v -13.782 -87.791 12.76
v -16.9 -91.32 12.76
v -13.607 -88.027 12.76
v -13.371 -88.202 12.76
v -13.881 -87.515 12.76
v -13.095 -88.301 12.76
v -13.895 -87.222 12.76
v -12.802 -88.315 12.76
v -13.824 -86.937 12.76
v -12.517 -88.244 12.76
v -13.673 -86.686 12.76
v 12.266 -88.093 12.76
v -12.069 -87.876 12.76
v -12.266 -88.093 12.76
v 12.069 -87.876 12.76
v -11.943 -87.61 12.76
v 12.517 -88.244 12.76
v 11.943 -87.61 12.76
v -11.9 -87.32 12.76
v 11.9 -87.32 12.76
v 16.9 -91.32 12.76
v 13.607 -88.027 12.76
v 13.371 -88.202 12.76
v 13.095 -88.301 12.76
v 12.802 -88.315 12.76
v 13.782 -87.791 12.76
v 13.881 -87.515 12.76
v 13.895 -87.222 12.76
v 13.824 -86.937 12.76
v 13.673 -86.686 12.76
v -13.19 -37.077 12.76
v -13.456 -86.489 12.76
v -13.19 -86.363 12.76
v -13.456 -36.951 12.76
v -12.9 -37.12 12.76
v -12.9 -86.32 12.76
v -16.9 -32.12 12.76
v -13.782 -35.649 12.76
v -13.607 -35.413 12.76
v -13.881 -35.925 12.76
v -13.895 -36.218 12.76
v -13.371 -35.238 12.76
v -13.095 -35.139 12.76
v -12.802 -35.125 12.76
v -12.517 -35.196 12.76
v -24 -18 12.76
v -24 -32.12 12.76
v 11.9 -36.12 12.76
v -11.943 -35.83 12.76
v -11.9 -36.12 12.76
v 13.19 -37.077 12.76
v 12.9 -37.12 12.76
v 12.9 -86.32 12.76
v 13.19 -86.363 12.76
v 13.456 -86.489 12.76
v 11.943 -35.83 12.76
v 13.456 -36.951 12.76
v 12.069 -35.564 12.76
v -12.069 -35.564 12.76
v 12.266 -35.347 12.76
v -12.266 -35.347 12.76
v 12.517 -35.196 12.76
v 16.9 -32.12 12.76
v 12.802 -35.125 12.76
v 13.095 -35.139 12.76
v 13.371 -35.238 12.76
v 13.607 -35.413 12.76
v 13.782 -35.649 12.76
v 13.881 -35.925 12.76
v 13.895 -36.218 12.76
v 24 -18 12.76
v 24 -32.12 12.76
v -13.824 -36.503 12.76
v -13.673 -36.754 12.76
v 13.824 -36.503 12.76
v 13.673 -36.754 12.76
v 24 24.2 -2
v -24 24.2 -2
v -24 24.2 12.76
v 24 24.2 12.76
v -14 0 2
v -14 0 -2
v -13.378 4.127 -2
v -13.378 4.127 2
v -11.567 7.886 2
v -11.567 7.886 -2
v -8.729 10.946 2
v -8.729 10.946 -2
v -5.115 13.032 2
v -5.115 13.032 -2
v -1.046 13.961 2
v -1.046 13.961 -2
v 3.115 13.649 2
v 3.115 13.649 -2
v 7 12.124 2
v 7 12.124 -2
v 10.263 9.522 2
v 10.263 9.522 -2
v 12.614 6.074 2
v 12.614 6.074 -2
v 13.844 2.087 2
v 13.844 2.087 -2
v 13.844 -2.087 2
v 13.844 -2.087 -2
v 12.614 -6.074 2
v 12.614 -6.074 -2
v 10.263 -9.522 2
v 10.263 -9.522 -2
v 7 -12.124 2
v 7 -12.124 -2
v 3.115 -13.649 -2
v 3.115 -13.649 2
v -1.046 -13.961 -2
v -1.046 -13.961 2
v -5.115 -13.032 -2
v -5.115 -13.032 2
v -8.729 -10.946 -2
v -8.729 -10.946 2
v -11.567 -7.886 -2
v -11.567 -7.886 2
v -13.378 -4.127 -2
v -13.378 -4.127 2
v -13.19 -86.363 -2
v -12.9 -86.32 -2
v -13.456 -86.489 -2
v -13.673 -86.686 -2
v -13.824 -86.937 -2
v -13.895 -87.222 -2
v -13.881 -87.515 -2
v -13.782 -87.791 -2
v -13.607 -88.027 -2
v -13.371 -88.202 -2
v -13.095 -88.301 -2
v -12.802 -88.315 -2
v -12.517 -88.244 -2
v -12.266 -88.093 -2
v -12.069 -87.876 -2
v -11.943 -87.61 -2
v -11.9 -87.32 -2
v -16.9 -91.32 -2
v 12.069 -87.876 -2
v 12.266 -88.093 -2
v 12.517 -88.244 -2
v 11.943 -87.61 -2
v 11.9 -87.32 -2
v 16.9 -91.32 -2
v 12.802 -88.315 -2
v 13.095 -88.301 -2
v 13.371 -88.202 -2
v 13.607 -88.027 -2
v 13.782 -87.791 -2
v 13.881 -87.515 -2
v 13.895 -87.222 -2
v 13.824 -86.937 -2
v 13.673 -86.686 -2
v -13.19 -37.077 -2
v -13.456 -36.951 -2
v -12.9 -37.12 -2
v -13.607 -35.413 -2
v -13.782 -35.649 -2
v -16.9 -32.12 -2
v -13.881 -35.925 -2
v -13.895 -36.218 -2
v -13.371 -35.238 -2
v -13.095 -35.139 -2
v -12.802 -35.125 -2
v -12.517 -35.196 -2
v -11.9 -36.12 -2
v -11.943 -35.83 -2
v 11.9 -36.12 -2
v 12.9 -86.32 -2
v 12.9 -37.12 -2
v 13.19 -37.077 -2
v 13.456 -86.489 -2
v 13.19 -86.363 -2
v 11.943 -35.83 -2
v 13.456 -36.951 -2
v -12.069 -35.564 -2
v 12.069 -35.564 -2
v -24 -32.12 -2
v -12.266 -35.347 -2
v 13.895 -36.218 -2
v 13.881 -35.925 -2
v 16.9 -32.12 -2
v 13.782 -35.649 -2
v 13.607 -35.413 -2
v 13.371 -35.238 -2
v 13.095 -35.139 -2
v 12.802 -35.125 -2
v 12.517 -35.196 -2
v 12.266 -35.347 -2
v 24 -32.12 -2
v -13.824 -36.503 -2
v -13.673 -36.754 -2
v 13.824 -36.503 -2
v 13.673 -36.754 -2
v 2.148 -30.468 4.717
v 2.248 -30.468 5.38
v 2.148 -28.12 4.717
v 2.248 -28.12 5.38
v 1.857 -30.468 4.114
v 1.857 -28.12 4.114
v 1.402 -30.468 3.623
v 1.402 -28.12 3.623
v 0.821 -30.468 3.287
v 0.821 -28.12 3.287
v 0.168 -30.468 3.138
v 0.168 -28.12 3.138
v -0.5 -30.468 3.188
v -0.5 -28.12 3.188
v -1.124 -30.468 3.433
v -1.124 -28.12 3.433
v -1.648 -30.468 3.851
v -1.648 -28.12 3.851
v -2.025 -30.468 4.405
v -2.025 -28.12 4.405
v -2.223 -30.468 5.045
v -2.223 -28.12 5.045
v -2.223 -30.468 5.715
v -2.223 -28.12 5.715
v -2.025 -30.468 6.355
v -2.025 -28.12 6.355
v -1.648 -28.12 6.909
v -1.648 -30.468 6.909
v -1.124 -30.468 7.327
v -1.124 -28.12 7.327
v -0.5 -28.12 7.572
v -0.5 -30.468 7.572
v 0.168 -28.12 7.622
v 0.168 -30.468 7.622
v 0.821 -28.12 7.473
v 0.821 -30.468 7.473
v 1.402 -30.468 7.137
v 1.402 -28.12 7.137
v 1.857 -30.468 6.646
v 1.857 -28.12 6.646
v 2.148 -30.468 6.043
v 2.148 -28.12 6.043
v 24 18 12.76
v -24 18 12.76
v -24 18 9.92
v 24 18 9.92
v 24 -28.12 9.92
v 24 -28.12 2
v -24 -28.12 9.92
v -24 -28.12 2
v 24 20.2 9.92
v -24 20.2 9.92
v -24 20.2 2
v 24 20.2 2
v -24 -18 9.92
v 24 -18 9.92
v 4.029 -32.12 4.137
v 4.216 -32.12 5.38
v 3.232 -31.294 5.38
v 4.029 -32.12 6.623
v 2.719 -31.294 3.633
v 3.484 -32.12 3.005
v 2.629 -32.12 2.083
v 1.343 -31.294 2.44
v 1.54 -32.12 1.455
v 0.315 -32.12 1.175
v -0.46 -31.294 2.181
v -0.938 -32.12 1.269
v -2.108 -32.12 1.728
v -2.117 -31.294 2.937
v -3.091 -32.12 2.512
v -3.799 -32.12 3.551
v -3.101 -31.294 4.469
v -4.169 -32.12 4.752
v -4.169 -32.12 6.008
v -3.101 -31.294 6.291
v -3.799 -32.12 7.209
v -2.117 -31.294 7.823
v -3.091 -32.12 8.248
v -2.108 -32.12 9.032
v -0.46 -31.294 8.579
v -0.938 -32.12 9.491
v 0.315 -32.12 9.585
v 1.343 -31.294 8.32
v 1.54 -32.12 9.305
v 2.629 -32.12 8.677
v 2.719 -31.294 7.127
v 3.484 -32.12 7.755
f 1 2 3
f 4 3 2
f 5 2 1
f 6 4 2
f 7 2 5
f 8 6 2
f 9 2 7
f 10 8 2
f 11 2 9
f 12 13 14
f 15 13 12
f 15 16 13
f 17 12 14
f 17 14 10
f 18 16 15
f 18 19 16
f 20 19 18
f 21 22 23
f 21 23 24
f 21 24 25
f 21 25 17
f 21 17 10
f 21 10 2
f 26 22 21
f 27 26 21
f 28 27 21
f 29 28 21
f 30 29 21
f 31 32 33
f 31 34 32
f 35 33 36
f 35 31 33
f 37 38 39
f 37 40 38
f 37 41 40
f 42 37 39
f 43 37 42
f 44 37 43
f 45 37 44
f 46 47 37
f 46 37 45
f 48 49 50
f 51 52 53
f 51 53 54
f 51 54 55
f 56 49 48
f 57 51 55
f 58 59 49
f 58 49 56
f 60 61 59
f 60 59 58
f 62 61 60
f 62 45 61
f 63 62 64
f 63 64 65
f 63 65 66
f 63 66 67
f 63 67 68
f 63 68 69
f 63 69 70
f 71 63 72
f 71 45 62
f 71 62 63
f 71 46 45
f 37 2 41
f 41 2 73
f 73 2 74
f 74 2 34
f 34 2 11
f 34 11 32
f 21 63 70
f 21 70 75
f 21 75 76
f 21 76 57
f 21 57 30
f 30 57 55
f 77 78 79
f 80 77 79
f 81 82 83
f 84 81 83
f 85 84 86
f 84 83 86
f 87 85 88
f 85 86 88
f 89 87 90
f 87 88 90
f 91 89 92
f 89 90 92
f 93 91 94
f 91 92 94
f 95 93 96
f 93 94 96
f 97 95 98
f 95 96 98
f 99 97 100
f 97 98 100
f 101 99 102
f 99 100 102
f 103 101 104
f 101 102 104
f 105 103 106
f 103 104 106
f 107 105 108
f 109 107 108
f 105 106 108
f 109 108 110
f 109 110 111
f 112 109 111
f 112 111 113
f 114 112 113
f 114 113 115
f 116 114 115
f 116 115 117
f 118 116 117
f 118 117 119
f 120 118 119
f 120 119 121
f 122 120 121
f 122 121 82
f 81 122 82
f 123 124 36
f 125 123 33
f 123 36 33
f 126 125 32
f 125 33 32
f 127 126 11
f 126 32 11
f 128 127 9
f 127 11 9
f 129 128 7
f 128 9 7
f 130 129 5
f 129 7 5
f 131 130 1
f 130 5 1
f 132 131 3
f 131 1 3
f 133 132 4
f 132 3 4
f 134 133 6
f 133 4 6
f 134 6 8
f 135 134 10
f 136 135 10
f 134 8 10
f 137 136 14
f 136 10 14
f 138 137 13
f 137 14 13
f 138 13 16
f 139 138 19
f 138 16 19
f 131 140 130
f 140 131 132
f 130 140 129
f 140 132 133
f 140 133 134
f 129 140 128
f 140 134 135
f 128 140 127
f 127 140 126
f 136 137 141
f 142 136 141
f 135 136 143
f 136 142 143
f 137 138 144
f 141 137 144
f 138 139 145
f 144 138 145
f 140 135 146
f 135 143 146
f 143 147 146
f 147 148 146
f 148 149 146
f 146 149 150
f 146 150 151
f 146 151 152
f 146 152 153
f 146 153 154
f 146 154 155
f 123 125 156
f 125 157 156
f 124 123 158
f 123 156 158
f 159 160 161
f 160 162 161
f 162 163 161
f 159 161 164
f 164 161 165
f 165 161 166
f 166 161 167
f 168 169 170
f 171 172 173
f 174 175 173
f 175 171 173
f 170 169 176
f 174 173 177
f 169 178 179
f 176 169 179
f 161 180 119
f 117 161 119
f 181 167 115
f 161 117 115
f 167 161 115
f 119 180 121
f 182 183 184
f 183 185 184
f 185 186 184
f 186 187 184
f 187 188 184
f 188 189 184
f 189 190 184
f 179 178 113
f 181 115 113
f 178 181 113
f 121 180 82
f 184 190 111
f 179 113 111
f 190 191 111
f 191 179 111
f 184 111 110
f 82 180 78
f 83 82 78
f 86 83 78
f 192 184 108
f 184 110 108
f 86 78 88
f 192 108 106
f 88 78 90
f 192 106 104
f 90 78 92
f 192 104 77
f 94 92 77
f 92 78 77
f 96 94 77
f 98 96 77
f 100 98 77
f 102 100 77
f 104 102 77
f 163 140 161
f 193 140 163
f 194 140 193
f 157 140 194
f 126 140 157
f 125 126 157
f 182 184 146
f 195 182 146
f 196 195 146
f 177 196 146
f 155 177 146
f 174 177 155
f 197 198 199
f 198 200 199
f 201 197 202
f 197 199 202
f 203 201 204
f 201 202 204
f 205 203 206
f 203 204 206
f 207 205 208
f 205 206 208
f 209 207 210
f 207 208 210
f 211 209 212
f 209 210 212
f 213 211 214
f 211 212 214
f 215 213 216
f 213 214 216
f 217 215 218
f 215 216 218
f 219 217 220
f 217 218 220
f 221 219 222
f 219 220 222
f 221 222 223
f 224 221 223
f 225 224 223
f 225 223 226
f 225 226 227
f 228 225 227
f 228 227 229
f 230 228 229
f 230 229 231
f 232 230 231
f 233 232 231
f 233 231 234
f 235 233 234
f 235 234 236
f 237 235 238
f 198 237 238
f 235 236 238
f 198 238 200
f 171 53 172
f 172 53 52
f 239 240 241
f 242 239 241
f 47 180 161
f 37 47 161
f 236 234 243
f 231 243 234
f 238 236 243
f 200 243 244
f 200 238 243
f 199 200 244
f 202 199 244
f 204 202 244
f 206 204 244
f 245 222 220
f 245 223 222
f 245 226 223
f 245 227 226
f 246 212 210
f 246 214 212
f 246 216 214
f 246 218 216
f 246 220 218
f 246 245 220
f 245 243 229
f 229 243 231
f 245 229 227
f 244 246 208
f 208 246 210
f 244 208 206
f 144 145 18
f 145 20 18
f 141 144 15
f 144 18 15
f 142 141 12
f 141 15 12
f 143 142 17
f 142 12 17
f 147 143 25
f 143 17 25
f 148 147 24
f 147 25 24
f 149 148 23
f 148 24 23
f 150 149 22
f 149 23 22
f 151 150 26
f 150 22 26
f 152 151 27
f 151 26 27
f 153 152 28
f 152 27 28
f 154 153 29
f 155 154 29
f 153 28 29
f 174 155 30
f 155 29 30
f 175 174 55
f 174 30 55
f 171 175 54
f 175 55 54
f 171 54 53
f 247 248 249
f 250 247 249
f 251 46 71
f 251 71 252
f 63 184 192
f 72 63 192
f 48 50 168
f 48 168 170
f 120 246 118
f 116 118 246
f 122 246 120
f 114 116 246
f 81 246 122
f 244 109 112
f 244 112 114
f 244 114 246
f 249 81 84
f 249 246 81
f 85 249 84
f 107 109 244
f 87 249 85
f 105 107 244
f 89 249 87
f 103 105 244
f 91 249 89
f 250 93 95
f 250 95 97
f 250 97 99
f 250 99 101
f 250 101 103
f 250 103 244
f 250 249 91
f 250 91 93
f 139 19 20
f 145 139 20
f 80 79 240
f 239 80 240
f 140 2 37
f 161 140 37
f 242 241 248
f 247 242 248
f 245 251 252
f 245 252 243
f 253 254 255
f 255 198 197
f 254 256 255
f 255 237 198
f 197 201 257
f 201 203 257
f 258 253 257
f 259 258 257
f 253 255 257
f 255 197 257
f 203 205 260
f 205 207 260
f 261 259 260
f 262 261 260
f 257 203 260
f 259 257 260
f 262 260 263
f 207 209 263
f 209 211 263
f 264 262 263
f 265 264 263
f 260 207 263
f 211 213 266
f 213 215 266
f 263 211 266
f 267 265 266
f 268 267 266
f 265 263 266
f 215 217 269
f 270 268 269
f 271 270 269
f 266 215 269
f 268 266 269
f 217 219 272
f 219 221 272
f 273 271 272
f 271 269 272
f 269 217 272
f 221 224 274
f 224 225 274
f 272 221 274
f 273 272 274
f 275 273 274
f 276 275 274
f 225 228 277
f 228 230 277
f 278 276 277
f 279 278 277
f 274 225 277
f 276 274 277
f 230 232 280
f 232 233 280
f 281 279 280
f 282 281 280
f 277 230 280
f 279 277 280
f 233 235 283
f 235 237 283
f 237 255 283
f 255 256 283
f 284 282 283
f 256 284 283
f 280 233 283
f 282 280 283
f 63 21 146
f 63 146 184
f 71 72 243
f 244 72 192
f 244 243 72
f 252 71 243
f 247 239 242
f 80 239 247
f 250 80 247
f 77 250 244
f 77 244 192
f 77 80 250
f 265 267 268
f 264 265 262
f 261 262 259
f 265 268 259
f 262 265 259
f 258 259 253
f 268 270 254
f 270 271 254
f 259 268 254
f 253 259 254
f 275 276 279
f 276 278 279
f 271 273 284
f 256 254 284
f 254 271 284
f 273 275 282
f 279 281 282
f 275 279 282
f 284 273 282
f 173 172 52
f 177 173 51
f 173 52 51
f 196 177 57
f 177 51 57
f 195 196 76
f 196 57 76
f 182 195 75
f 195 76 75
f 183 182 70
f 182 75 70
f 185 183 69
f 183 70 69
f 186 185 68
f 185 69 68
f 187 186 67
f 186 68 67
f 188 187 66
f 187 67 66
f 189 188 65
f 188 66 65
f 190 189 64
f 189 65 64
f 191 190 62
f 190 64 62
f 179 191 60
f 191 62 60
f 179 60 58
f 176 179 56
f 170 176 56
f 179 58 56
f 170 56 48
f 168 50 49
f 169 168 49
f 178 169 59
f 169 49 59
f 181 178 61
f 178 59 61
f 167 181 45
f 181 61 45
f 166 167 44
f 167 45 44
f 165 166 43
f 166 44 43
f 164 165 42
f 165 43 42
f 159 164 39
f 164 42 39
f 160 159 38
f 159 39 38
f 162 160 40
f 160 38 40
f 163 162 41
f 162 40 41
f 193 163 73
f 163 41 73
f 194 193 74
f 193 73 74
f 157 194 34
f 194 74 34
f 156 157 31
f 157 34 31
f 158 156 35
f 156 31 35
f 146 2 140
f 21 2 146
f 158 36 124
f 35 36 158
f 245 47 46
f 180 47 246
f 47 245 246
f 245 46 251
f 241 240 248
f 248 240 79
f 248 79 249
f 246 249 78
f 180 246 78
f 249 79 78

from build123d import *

# Parameters (mm, degrees)
BOSS_EXTRUDE1_DEPTH                               = 2
BOSS_EXTRUDE1_DEPTH_BACK                          = 2
SKETCH1_W                                         = 48
SKETCH1_H                                         = 56.32
BOSS_EXTRUDE2_DEPTH                               = 48
SKETCH4_R                                         = 14
CUT_EXTRUDE1_DEPTH                                = 43.726478909
CSK_FOR_8_FLAT_HEAD_MACHINE_SCREW_100_D           = 4.4958
CSK_FOR_8_FLAT_HEAD_MACHINE_SCREW_100_DEPTH       = 8
CSK_FOR_8_FLAT_HEAD_MACHINE_SCREW_100_CSINK_D     = 8.4328
CSK_FOR_8_FLAT_HEAD_MACHINE_SCREW_100_CSINK_ANGLE = 100
CSK_FOR_8_FLAT_HEAD_MACHINE_SCREW_100_TIP         = 1.350674586
SKETCH13_W                                        = 33.8
SKETCH13_H                                        = 59.2
SKETCH13_W_2                                      = 25.8
SKETCH13_H_2                                      = 51.2
BOSS_EXTRUDE4_DEPTH                               = 14.76
SKETCH14_R                                        = 1
CUT_EXTRUDE5_DEPTH                                = 96.567776996


with BuildPart() as part:
    # Sketch1 → Boss-Extrude1 (new, two sides: drawn at the far end of the back side and taken through both)
    with BuildSketch(Plane.XY.offset(-BOSS_EXTRUDE1_DEPTH_BACK)):
        with Locations((0, -3.96)):
            Rectangle(SKETCH1_W, SKETCH1_H)
    extrude(amount=BOSS_EXTRUDE1_DEPTH + BOSS_EXTRUDE1_DEPTH_BACK)

    # Sketch3 → Boss-Extrude2 (add)
    with BuildSketch(Plane.ZY.offset(24)):
        Polygon((2, 24.2), (12.76, 24.2), (12.76, 18), (9.92, 18), (9.92, 20.2), (2, 20.2), align=None)
        Polygon((12.76, -18), (9.92, -18), (9.92, -28.12), (2, -28.12), (2, -32.12), (12.76, -32.12), align=None)
    extrude(amount=-BOSS_EXTRUDE2_DEPTH)

    # Sketch4 → Cut-Extrude1 (cut, through all)
    with BuildSketch(Plane(origin=(0, 0, -2), x_dir=(-1, 0, 0), z_dir=(0, 0, -1))):
        Circle(SKETCH4_R)
    extrude(amount=-CUT_EXTRUDE1_DEPTH, mode=Mode.SUBTRACT)

    # CSK for #8 Flat Head Machine Screw (100)1
    with Locations(Plane(origin=(0, -32.12, 0), x_dir=(-1, 0, 0), z_dir=(0, -1, 0))):
        with Locations((0, -5.38)):
            CounterSinkHole(CSK_FOR_8_FLAT_HEAD_MACHINE_SCREW_100_D / 2, CSK_FOR_8_FLAT_HEAD_MACHINE_SCREW_100_CSINK_D / 2, depth=CSK_FOR_8_FLAT_HEAD_MACHINE_SCREW_100_DEPTH, counter_sink_angle=CSK_FOR_8_FLAT_HEAD_MACHINE_SCREW_100_CSINK_ANGLE)
            with Locations((0, 0, -(CSK_FOR_8_FLAT_HEAD_MACHINE_SCREW_100_DEPTH + CSK_FOR_8_FLAT_HEAD_MACHINE_SCREW_100_TIP / 2))):  # 118° drill point
                Cone(0, CSK_FOR_8_FLAT_HEAD_MACHINE_SCREW_100_D / 2, CSK_FOR_8_FLAT_HEAD_MACHINE_SCREW_100_TIP, mode=Mode.SUBTRACT)

    # Sketch13 → Boss-Extrude4 (add)
    with BuildSketch(Plane.XY.offset(12.76)):
        with Locations((0, -61.72)):
            Rectangle(SKETCH13_W, SKETCH13_H)
        with Locations((0, -61.72)):
            Rectangle(SKETCH13_W_2, SKETCH13_H_2, mode=Mode.SUBTRACT)
    extrude(amount=-BOSS_EXTRUDE4_DEPTH)

    # Sketch14 → Cut-Extrude5 (cut, through all)
    with BuildSketch(Plane.XY.offset(12.76)):
        with Locations((-12.9, -36.12)):
            Circle(SKETCH14_R)
        with Locations((12.9, -36.12)):
            Circle(SKETCH14_R)
        with Locations((12.9, -87.32)):
            Circle(SKETCH14_R)
        with Locations((-12.9, -87.32)):
            Circle(SKETCH14_R)
    extrude(amount=-CUT_EXTRUDE5_DEPTH, mode=Mode.SUBTRACT)


solid = part.part
